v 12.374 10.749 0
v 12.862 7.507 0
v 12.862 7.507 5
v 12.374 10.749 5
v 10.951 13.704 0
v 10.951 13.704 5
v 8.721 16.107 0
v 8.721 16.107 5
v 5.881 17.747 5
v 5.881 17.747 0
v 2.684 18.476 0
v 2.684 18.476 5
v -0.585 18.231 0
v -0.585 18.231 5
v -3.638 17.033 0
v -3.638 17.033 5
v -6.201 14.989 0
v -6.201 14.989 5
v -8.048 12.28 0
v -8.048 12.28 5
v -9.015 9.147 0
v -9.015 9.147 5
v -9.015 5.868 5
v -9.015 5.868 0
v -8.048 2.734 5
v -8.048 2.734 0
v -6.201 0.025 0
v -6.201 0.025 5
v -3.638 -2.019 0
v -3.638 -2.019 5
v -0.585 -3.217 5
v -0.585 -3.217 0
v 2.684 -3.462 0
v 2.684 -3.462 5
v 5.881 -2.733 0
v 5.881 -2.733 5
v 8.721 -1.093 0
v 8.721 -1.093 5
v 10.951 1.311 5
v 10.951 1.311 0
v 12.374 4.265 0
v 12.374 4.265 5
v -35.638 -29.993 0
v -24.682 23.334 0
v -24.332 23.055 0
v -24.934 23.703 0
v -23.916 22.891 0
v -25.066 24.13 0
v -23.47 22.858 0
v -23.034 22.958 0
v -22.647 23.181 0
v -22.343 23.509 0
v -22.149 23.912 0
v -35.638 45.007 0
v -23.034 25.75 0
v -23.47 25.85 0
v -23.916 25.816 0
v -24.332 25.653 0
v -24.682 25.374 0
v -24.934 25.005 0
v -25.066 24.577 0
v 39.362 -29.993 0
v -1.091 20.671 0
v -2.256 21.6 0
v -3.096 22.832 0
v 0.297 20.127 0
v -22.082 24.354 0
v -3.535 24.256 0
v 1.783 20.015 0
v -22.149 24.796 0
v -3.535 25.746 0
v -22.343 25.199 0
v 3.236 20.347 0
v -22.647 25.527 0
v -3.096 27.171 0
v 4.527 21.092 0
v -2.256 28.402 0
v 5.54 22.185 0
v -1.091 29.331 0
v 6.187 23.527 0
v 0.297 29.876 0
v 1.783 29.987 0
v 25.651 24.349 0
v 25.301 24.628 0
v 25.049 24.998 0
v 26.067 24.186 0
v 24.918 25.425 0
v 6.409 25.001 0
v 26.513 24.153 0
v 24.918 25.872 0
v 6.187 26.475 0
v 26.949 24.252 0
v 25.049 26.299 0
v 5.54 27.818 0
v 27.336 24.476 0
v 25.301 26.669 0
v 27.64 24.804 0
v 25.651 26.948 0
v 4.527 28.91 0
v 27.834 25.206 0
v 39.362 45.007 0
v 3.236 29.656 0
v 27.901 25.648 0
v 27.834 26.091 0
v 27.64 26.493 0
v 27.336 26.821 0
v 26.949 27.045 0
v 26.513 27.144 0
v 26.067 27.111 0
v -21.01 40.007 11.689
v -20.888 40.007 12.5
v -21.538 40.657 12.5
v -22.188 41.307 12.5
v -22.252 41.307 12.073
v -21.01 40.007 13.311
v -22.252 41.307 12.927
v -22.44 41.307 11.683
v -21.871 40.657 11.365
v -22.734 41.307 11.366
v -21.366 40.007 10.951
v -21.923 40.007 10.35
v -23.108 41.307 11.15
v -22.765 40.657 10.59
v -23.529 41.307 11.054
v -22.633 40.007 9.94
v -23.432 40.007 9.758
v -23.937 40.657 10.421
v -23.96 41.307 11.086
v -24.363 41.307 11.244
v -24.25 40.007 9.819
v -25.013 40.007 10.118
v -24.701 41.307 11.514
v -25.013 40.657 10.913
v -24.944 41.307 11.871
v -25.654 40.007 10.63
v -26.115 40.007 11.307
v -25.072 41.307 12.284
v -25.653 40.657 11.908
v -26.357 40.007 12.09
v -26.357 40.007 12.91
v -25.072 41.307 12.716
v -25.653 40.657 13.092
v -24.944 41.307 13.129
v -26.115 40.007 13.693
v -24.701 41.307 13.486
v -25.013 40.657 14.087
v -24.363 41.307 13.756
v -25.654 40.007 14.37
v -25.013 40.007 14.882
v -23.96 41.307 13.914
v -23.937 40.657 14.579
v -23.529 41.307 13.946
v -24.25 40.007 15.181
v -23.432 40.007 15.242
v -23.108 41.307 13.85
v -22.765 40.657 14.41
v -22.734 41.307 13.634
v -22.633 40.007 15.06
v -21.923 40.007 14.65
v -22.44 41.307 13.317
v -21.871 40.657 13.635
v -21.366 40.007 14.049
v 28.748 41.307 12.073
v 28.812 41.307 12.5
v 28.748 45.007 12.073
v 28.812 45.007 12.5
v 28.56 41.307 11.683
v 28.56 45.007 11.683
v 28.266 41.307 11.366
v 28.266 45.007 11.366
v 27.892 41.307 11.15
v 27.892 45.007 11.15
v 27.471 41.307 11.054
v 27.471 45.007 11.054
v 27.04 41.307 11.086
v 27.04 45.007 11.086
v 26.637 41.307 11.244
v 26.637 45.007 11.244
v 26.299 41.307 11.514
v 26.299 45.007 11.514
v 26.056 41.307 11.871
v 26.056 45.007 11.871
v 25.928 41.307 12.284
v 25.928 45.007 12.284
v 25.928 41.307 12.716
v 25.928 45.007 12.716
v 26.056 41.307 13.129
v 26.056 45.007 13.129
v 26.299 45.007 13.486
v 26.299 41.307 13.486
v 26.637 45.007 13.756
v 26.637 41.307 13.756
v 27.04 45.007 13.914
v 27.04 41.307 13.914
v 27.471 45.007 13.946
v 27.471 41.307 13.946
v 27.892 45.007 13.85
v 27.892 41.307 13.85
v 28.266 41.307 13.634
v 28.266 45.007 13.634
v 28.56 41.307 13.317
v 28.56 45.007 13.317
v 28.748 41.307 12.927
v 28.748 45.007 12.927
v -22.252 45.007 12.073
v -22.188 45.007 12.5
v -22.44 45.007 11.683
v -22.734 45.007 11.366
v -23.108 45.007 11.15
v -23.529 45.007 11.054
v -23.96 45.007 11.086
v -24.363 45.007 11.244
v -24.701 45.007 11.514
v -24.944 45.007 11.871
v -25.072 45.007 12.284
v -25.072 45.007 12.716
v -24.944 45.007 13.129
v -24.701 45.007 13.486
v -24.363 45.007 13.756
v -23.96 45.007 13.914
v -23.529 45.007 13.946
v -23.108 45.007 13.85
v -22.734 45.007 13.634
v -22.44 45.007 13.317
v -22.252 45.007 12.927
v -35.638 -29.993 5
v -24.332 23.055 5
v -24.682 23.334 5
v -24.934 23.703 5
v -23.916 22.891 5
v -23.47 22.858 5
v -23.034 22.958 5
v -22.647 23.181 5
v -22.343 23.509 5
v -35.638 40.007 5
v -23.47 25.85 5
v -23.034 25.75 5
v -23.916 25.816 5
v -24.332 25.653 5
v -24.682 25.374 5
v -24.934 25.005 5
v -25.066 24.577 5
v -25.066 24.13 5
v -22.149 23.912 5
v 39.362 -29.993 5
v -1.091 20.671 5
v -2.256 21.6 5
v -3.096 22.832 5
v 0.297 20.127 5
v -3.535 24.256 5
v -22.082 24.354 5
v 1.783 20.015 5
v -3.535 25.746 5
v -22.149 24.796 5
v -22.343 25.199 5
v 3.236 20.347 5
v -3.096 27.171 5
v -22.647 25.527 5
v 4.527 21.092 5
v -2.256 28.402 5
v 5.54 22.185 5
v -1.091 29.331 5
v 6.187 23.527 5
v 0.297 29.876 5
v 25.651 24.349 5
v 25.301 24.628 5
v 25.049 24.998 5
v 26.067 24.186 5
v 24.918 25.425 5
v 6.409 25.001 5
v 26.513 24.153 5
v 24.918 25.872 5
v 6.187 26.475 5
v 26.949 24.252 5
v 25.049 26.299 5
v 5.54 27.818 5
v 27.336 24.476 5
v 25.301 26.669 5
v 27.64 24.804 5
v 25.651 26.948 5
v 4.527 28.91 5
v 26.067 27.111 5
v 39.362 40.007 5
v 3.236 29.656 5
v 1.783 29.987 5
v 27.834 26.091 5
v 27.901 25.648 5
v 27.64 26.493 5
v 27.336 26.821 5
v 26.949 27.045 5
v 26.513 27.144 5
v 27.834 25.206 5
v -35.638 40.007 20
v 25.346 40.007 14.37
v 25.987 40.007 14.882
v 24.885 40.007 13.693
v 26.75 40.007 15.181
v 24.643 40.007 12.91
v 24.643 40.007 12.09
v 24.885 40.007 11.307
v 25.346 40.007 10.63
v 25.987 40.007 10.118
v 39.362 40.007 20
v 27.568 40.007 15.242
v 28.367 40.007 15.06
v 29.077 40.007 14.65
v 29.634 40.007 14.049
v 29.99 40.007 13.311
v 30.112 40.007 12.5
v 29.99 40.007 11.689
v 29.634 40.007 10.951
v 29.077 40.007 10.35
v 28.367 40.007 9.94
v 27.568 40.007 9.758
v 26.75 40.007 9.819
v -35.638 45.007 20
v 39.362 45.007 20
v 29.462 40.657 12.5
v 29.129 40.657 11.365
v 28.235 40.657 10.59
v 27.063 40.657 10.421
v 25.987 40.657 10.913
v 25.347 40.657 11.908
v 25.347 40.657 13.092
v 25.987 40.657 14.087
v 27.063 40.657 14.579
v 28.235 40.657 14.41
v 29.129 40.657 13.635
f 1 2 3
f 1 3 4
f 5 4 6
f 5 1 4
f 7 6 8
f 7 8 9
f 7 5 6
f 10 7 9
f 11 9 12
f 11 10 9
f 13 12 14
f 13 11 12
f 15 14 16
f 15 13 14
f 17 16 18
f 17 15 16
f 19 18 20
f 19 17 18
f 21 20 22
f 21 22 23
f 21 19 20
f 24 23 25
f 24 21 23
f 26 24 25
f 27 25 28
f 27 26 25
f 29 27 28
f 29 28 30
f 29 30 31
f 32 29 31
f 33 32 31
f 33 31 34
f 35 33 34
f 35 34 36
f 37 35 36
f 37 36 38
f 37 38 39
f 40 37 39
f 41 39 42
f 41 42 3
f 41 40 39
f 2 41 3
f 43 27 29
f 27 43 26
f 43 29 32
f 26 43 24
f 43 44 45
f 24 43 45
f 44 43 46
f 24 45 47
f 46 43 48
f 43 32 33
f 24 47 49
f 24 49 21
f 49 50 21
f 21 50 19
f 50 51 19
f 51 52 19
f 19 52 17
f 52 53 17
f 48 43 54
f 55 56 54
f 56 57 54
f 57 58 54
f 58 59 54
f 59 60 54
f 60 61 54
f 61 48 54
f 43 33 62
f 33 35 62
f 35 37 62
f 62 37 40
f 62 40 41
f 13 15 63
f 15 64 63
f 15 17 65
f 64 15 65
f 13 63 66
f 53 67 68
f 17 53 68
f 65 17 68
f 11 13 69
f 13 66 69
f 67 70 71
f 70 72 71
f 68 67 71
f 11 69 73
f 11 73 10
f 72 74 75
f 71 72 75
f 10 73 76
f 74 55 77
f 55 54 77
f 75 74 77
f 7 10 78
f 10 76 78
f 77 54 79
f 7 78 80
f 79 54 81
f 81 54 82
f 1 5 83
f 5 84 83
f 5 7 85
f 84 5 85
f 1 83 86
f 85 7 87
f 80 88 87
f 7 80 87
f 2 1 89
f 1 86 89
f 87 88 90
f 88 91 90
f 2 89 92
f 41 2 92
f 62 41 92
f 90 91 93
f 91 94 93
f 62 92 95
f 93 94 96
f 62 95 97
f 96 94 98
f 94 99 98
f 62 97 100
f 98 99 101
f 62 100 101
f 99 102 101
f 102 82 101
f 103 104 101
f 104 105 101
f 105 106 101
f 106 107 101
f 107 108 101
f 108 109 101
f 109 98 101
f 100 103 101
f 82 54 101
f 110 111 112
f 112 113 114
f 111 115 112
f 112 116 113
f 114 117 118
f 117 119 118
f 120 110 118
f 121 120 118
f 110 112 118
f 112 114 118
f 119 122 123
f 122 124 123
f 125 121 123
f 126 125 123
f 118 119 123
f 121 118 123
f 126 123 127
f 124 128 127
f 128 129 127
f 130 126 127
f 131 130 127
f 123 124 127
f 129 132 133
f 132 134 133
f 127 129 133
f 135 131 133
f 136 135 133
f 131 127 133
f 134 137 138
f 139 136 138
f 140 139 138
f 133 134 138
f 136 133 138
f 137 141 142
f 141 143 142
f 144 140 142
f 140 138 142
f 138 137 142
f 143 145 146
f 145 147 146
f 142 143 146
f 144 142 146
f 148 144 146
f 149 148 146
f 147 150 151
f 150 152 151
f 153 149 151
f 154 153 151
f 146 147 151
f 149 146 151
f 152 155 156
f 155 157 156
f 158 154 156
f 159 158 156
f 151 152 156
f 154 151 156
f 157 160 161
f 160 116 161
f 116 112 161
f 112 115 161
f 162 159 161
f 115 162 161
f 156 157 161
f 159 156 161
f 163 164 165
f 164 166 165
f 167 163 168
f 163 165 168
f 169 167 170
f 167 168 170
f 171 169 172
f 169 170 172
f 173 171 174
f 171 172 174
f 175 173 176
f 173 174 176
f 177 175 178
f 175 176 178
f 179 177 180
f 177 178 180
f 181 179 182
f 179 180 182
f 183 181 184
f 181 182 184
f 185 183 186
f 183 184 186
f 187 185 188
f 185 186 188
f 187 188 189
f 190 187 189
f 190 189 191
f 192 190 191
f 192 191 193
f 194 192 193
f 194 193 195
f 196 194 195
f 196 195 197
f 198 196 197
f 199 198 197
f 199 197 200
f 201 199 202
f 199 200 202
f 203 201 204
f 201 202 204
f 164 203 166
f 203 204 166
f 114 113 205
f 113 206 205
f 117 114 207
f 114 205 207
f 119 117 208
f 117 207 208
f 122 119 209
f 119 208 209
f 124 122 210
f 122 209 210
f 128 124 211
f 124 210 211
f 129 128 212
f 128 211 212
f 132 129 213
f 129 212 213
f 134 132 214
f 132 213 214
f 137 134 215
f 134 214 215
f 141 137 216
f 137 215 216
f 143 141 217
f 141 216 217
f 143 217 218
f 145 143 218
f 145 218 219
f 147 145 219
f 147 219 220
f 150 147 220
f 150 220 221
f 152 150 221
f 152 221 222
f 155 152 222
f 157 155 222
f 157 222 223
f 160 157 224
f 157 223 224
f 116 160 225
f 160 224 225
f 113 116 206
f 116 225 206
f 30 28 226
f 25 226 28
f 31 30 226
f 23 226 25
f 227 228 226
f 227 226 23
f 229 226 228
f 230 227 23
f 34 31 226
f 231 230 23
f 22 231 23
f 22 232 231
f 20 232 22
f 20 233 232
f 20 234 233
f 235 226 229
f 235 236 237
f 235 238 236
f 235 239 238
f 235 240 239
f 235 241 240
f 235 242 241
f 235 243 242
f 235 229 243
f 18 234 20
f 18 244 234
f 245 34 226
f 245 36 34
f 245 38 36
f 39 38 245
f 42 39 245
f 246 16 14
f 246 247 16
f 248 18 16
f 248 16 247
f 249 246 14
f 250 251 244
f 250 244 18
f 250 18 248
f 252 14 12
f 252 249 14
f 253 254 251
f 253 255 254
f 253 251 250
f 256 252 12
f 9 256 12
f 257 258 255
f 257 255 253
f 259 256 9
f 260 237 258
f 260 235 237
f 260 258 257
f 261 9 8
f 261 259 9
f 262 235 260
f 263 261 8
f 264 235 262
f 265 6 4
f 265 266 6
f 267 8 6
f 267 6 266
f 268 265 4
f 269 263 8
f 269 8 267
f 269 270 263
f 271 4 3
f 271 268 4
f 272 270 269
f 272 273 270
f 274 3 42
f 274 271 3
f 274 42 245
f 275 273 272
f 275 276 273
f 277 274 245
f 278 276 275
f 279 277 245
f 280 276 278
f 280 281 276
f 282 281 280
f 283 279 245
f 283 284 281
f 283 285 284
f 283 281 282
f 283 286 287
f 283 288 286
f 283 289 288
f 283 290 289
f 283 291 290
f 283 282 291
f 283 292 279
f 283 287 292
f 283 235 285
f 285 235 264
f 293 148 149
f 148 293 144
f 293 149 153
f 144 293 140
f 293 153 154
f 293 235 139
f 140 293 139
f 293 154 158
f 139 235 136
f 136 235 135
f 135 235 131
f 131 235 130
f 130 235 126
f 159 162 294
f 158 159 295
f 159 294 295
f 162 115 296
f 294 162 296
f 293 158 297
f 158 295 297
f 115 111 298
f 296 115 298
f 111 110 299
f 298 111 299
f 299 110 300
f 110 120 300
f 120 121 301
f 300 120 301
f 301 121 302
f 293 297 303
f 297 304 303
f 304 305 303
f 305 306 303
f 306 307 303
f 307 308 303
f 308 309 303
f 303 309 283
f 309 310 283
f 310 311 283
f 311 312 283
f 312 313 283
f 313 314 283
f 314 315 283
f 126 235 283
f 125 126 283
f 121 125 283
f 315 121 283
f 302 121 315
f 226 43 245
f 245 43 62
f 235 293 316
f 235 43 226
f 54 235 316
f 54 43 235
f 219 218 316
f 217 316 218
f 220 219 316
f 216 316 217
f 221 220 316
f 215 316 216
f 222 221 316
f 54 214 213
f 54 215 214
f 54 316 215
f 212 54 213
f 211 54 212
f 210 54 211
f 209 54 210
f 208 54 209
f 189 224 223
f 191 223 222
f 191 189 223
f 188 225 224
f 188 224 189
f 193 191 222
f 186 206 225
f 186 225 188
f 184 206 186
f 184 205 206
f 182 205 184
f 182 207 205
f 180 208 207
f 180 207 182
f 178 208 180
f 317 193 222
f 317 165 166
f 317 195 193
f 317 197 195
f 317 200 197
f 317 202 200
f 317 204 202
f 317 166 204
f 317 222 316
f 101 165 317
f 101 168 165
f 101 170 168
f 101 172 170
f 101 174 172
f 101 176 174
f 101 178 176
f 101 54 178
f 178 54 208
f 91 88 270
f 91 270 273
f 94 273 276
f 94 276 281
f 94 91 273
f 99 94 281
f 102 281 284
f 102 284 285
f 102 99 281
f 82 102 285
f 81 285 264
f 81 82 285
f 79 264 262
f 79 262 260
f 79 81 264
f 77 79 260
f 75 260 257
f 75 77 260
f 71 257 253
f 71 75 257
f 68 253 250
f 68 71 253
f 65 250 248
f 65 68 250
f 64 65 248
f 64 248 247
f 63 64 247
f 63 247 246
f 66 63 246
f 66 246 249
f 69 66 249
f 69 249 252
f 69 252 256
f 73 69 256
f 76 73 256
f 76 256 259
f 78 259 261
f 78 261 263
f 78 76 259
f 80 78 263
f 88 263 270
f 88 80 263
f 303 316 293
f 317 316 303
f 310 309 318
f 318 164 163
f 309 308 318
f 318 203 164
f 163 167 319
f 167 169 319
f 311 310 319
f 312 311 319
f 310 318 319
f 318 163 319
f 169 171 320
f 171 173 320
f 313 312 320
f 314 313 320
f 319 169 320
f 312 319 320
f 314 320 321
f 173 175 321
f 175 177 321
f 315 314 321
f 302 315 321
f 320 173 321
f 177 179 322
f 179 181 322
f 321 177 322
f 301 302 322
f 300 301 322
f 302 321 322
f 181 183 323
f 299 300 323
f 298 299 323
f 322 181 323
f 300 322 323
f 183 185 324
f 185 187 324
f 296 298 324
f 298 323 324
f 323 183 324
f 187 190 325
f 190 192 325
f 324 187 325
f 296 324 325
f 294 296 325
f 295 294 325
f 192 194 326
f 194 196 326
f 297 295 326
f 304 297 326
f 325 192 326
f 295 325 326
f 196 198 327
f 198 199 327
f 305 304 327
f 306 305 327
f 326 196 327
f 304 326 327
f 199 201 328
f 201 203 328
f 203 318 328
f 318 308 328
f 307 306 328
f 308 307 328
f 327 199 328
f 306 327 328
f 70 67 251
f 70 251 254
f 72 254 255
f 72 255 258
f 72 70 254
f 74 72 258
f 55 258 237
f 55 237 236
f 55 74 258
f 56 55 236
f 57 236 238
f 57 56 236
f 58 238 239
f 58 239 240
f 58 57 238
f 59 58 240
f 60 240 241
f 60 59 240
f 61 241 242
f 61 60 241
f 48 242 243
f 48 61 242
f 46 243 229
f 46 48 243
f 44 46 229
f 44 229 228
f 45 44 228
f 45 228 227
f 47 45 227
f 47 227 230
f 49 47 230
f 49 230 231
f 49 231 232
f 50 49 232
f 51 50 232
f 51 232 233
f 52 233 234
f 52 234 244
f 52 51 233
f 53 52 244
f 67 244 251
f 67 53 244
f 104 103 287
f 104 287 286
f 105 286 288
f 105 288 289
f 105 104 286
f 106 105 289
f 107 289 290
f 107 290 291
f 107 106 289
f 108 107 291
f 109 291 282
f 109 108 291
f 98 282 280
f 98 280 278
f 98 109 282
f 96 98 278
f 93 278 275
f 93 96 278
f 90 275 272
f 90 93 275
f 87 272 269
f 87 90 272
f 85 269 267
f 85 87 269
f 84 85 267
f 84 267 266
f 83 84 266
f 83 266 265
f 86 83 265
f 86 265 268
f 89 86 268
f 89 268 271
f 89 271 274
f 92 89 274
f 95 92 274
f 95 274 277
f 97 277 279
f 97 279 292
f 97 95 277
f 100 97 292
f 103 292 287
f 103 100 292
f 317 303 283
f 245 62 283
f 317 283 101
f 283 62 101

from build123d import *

# Parameters (mm, degrees)
SKETCH1_W                                         = 75
SKETCH1_H                                         = 75
SKETCH1_R                                         = 11
SKETCH1_R_2                                       = 5
SKETCH1_R_3                                       = 1.5
BOSS_EXTRUDE1_DEPTH                               = 5
SKETCH3_W                                         = 75
SKETCH3_H                                         = 5
BOSS_EXTRUDE2_DEPTH                               = 15
CSK_FOR_M2_5_FLAT_HEAD_MACHINE_SCREW1_D           = 2.9
CSK_FOR_M2_5_FLAT_HEAD_MACHINE_SCREW1_CSINK_D     = 5.5
CSK_FOR_M2_5_FLAT_HEAD_MACHINE_SCREW1_CSINK_ANGLE = 90


with BuildPart() as part:
    # Sketch1 → Boss-Extrude1 (new body)
    with BuildSketch(Plane.XY):
        with Locations((1.86226596, 7.507049672)):
            Rectangle(SKETCH1_W, SKETCH1_H)
        with Locations((1.86226596, 7.507049672)):
            Circle(SKETCH1_R, mode=Mode.SUBTRACT)
        with Locations((1.409145794, 25.001182464)):
            Circle(SKETCH1_R_2, mode=Mode.SUBTRACT)
        with Locations((-23.582472479, 24.353867941)):
            Circle(SKETCH1_R_3, mode=Mode.SUBTRACT)
        with Locations((26.400764067, 25.648496986)):
            Circle(SKETCH1_R_3, mode=Mode.SUBTRACT)
    extrude(amount=BOSS_EXTRUDE1_DEPTH)

    # Sketch3 → Boss-Extrude2 (add)
    with BuildSketch(Plane.XY.offset(5)):
        with Locations((1.86226596, 42.507049672)):
            Rectangle(SKETCH3_W, SKETCH3_H)
    extrude(amount=BOSS_EXTRUDE2_DEPTH)

    # CSK for M2.5 Flat Head Machine Screw1 (through all)
    with Locations(Plane(origin=(0, 40.007049672, 0), x_dir=(-1, 0, 0), z_dir=(0, -1, 0))):
        with Locations((-27.36226596, -12.5), (23.63773404, -12.5)):
            CounterSinkHole(CSK_FOR_M2_5_FLAT_HEAD_MACHINE_SCREW1_D / 2, CSK_FOR_M2_5_FLAT_HEAD_MACHINE_SCREW1_CSINK_D / 2, counter_sink_angle=CSK_FOR_M2_5_FLAT_HEAD_MACHINE_SCREW1_CSINK_ANGLE)


solid = part.part
